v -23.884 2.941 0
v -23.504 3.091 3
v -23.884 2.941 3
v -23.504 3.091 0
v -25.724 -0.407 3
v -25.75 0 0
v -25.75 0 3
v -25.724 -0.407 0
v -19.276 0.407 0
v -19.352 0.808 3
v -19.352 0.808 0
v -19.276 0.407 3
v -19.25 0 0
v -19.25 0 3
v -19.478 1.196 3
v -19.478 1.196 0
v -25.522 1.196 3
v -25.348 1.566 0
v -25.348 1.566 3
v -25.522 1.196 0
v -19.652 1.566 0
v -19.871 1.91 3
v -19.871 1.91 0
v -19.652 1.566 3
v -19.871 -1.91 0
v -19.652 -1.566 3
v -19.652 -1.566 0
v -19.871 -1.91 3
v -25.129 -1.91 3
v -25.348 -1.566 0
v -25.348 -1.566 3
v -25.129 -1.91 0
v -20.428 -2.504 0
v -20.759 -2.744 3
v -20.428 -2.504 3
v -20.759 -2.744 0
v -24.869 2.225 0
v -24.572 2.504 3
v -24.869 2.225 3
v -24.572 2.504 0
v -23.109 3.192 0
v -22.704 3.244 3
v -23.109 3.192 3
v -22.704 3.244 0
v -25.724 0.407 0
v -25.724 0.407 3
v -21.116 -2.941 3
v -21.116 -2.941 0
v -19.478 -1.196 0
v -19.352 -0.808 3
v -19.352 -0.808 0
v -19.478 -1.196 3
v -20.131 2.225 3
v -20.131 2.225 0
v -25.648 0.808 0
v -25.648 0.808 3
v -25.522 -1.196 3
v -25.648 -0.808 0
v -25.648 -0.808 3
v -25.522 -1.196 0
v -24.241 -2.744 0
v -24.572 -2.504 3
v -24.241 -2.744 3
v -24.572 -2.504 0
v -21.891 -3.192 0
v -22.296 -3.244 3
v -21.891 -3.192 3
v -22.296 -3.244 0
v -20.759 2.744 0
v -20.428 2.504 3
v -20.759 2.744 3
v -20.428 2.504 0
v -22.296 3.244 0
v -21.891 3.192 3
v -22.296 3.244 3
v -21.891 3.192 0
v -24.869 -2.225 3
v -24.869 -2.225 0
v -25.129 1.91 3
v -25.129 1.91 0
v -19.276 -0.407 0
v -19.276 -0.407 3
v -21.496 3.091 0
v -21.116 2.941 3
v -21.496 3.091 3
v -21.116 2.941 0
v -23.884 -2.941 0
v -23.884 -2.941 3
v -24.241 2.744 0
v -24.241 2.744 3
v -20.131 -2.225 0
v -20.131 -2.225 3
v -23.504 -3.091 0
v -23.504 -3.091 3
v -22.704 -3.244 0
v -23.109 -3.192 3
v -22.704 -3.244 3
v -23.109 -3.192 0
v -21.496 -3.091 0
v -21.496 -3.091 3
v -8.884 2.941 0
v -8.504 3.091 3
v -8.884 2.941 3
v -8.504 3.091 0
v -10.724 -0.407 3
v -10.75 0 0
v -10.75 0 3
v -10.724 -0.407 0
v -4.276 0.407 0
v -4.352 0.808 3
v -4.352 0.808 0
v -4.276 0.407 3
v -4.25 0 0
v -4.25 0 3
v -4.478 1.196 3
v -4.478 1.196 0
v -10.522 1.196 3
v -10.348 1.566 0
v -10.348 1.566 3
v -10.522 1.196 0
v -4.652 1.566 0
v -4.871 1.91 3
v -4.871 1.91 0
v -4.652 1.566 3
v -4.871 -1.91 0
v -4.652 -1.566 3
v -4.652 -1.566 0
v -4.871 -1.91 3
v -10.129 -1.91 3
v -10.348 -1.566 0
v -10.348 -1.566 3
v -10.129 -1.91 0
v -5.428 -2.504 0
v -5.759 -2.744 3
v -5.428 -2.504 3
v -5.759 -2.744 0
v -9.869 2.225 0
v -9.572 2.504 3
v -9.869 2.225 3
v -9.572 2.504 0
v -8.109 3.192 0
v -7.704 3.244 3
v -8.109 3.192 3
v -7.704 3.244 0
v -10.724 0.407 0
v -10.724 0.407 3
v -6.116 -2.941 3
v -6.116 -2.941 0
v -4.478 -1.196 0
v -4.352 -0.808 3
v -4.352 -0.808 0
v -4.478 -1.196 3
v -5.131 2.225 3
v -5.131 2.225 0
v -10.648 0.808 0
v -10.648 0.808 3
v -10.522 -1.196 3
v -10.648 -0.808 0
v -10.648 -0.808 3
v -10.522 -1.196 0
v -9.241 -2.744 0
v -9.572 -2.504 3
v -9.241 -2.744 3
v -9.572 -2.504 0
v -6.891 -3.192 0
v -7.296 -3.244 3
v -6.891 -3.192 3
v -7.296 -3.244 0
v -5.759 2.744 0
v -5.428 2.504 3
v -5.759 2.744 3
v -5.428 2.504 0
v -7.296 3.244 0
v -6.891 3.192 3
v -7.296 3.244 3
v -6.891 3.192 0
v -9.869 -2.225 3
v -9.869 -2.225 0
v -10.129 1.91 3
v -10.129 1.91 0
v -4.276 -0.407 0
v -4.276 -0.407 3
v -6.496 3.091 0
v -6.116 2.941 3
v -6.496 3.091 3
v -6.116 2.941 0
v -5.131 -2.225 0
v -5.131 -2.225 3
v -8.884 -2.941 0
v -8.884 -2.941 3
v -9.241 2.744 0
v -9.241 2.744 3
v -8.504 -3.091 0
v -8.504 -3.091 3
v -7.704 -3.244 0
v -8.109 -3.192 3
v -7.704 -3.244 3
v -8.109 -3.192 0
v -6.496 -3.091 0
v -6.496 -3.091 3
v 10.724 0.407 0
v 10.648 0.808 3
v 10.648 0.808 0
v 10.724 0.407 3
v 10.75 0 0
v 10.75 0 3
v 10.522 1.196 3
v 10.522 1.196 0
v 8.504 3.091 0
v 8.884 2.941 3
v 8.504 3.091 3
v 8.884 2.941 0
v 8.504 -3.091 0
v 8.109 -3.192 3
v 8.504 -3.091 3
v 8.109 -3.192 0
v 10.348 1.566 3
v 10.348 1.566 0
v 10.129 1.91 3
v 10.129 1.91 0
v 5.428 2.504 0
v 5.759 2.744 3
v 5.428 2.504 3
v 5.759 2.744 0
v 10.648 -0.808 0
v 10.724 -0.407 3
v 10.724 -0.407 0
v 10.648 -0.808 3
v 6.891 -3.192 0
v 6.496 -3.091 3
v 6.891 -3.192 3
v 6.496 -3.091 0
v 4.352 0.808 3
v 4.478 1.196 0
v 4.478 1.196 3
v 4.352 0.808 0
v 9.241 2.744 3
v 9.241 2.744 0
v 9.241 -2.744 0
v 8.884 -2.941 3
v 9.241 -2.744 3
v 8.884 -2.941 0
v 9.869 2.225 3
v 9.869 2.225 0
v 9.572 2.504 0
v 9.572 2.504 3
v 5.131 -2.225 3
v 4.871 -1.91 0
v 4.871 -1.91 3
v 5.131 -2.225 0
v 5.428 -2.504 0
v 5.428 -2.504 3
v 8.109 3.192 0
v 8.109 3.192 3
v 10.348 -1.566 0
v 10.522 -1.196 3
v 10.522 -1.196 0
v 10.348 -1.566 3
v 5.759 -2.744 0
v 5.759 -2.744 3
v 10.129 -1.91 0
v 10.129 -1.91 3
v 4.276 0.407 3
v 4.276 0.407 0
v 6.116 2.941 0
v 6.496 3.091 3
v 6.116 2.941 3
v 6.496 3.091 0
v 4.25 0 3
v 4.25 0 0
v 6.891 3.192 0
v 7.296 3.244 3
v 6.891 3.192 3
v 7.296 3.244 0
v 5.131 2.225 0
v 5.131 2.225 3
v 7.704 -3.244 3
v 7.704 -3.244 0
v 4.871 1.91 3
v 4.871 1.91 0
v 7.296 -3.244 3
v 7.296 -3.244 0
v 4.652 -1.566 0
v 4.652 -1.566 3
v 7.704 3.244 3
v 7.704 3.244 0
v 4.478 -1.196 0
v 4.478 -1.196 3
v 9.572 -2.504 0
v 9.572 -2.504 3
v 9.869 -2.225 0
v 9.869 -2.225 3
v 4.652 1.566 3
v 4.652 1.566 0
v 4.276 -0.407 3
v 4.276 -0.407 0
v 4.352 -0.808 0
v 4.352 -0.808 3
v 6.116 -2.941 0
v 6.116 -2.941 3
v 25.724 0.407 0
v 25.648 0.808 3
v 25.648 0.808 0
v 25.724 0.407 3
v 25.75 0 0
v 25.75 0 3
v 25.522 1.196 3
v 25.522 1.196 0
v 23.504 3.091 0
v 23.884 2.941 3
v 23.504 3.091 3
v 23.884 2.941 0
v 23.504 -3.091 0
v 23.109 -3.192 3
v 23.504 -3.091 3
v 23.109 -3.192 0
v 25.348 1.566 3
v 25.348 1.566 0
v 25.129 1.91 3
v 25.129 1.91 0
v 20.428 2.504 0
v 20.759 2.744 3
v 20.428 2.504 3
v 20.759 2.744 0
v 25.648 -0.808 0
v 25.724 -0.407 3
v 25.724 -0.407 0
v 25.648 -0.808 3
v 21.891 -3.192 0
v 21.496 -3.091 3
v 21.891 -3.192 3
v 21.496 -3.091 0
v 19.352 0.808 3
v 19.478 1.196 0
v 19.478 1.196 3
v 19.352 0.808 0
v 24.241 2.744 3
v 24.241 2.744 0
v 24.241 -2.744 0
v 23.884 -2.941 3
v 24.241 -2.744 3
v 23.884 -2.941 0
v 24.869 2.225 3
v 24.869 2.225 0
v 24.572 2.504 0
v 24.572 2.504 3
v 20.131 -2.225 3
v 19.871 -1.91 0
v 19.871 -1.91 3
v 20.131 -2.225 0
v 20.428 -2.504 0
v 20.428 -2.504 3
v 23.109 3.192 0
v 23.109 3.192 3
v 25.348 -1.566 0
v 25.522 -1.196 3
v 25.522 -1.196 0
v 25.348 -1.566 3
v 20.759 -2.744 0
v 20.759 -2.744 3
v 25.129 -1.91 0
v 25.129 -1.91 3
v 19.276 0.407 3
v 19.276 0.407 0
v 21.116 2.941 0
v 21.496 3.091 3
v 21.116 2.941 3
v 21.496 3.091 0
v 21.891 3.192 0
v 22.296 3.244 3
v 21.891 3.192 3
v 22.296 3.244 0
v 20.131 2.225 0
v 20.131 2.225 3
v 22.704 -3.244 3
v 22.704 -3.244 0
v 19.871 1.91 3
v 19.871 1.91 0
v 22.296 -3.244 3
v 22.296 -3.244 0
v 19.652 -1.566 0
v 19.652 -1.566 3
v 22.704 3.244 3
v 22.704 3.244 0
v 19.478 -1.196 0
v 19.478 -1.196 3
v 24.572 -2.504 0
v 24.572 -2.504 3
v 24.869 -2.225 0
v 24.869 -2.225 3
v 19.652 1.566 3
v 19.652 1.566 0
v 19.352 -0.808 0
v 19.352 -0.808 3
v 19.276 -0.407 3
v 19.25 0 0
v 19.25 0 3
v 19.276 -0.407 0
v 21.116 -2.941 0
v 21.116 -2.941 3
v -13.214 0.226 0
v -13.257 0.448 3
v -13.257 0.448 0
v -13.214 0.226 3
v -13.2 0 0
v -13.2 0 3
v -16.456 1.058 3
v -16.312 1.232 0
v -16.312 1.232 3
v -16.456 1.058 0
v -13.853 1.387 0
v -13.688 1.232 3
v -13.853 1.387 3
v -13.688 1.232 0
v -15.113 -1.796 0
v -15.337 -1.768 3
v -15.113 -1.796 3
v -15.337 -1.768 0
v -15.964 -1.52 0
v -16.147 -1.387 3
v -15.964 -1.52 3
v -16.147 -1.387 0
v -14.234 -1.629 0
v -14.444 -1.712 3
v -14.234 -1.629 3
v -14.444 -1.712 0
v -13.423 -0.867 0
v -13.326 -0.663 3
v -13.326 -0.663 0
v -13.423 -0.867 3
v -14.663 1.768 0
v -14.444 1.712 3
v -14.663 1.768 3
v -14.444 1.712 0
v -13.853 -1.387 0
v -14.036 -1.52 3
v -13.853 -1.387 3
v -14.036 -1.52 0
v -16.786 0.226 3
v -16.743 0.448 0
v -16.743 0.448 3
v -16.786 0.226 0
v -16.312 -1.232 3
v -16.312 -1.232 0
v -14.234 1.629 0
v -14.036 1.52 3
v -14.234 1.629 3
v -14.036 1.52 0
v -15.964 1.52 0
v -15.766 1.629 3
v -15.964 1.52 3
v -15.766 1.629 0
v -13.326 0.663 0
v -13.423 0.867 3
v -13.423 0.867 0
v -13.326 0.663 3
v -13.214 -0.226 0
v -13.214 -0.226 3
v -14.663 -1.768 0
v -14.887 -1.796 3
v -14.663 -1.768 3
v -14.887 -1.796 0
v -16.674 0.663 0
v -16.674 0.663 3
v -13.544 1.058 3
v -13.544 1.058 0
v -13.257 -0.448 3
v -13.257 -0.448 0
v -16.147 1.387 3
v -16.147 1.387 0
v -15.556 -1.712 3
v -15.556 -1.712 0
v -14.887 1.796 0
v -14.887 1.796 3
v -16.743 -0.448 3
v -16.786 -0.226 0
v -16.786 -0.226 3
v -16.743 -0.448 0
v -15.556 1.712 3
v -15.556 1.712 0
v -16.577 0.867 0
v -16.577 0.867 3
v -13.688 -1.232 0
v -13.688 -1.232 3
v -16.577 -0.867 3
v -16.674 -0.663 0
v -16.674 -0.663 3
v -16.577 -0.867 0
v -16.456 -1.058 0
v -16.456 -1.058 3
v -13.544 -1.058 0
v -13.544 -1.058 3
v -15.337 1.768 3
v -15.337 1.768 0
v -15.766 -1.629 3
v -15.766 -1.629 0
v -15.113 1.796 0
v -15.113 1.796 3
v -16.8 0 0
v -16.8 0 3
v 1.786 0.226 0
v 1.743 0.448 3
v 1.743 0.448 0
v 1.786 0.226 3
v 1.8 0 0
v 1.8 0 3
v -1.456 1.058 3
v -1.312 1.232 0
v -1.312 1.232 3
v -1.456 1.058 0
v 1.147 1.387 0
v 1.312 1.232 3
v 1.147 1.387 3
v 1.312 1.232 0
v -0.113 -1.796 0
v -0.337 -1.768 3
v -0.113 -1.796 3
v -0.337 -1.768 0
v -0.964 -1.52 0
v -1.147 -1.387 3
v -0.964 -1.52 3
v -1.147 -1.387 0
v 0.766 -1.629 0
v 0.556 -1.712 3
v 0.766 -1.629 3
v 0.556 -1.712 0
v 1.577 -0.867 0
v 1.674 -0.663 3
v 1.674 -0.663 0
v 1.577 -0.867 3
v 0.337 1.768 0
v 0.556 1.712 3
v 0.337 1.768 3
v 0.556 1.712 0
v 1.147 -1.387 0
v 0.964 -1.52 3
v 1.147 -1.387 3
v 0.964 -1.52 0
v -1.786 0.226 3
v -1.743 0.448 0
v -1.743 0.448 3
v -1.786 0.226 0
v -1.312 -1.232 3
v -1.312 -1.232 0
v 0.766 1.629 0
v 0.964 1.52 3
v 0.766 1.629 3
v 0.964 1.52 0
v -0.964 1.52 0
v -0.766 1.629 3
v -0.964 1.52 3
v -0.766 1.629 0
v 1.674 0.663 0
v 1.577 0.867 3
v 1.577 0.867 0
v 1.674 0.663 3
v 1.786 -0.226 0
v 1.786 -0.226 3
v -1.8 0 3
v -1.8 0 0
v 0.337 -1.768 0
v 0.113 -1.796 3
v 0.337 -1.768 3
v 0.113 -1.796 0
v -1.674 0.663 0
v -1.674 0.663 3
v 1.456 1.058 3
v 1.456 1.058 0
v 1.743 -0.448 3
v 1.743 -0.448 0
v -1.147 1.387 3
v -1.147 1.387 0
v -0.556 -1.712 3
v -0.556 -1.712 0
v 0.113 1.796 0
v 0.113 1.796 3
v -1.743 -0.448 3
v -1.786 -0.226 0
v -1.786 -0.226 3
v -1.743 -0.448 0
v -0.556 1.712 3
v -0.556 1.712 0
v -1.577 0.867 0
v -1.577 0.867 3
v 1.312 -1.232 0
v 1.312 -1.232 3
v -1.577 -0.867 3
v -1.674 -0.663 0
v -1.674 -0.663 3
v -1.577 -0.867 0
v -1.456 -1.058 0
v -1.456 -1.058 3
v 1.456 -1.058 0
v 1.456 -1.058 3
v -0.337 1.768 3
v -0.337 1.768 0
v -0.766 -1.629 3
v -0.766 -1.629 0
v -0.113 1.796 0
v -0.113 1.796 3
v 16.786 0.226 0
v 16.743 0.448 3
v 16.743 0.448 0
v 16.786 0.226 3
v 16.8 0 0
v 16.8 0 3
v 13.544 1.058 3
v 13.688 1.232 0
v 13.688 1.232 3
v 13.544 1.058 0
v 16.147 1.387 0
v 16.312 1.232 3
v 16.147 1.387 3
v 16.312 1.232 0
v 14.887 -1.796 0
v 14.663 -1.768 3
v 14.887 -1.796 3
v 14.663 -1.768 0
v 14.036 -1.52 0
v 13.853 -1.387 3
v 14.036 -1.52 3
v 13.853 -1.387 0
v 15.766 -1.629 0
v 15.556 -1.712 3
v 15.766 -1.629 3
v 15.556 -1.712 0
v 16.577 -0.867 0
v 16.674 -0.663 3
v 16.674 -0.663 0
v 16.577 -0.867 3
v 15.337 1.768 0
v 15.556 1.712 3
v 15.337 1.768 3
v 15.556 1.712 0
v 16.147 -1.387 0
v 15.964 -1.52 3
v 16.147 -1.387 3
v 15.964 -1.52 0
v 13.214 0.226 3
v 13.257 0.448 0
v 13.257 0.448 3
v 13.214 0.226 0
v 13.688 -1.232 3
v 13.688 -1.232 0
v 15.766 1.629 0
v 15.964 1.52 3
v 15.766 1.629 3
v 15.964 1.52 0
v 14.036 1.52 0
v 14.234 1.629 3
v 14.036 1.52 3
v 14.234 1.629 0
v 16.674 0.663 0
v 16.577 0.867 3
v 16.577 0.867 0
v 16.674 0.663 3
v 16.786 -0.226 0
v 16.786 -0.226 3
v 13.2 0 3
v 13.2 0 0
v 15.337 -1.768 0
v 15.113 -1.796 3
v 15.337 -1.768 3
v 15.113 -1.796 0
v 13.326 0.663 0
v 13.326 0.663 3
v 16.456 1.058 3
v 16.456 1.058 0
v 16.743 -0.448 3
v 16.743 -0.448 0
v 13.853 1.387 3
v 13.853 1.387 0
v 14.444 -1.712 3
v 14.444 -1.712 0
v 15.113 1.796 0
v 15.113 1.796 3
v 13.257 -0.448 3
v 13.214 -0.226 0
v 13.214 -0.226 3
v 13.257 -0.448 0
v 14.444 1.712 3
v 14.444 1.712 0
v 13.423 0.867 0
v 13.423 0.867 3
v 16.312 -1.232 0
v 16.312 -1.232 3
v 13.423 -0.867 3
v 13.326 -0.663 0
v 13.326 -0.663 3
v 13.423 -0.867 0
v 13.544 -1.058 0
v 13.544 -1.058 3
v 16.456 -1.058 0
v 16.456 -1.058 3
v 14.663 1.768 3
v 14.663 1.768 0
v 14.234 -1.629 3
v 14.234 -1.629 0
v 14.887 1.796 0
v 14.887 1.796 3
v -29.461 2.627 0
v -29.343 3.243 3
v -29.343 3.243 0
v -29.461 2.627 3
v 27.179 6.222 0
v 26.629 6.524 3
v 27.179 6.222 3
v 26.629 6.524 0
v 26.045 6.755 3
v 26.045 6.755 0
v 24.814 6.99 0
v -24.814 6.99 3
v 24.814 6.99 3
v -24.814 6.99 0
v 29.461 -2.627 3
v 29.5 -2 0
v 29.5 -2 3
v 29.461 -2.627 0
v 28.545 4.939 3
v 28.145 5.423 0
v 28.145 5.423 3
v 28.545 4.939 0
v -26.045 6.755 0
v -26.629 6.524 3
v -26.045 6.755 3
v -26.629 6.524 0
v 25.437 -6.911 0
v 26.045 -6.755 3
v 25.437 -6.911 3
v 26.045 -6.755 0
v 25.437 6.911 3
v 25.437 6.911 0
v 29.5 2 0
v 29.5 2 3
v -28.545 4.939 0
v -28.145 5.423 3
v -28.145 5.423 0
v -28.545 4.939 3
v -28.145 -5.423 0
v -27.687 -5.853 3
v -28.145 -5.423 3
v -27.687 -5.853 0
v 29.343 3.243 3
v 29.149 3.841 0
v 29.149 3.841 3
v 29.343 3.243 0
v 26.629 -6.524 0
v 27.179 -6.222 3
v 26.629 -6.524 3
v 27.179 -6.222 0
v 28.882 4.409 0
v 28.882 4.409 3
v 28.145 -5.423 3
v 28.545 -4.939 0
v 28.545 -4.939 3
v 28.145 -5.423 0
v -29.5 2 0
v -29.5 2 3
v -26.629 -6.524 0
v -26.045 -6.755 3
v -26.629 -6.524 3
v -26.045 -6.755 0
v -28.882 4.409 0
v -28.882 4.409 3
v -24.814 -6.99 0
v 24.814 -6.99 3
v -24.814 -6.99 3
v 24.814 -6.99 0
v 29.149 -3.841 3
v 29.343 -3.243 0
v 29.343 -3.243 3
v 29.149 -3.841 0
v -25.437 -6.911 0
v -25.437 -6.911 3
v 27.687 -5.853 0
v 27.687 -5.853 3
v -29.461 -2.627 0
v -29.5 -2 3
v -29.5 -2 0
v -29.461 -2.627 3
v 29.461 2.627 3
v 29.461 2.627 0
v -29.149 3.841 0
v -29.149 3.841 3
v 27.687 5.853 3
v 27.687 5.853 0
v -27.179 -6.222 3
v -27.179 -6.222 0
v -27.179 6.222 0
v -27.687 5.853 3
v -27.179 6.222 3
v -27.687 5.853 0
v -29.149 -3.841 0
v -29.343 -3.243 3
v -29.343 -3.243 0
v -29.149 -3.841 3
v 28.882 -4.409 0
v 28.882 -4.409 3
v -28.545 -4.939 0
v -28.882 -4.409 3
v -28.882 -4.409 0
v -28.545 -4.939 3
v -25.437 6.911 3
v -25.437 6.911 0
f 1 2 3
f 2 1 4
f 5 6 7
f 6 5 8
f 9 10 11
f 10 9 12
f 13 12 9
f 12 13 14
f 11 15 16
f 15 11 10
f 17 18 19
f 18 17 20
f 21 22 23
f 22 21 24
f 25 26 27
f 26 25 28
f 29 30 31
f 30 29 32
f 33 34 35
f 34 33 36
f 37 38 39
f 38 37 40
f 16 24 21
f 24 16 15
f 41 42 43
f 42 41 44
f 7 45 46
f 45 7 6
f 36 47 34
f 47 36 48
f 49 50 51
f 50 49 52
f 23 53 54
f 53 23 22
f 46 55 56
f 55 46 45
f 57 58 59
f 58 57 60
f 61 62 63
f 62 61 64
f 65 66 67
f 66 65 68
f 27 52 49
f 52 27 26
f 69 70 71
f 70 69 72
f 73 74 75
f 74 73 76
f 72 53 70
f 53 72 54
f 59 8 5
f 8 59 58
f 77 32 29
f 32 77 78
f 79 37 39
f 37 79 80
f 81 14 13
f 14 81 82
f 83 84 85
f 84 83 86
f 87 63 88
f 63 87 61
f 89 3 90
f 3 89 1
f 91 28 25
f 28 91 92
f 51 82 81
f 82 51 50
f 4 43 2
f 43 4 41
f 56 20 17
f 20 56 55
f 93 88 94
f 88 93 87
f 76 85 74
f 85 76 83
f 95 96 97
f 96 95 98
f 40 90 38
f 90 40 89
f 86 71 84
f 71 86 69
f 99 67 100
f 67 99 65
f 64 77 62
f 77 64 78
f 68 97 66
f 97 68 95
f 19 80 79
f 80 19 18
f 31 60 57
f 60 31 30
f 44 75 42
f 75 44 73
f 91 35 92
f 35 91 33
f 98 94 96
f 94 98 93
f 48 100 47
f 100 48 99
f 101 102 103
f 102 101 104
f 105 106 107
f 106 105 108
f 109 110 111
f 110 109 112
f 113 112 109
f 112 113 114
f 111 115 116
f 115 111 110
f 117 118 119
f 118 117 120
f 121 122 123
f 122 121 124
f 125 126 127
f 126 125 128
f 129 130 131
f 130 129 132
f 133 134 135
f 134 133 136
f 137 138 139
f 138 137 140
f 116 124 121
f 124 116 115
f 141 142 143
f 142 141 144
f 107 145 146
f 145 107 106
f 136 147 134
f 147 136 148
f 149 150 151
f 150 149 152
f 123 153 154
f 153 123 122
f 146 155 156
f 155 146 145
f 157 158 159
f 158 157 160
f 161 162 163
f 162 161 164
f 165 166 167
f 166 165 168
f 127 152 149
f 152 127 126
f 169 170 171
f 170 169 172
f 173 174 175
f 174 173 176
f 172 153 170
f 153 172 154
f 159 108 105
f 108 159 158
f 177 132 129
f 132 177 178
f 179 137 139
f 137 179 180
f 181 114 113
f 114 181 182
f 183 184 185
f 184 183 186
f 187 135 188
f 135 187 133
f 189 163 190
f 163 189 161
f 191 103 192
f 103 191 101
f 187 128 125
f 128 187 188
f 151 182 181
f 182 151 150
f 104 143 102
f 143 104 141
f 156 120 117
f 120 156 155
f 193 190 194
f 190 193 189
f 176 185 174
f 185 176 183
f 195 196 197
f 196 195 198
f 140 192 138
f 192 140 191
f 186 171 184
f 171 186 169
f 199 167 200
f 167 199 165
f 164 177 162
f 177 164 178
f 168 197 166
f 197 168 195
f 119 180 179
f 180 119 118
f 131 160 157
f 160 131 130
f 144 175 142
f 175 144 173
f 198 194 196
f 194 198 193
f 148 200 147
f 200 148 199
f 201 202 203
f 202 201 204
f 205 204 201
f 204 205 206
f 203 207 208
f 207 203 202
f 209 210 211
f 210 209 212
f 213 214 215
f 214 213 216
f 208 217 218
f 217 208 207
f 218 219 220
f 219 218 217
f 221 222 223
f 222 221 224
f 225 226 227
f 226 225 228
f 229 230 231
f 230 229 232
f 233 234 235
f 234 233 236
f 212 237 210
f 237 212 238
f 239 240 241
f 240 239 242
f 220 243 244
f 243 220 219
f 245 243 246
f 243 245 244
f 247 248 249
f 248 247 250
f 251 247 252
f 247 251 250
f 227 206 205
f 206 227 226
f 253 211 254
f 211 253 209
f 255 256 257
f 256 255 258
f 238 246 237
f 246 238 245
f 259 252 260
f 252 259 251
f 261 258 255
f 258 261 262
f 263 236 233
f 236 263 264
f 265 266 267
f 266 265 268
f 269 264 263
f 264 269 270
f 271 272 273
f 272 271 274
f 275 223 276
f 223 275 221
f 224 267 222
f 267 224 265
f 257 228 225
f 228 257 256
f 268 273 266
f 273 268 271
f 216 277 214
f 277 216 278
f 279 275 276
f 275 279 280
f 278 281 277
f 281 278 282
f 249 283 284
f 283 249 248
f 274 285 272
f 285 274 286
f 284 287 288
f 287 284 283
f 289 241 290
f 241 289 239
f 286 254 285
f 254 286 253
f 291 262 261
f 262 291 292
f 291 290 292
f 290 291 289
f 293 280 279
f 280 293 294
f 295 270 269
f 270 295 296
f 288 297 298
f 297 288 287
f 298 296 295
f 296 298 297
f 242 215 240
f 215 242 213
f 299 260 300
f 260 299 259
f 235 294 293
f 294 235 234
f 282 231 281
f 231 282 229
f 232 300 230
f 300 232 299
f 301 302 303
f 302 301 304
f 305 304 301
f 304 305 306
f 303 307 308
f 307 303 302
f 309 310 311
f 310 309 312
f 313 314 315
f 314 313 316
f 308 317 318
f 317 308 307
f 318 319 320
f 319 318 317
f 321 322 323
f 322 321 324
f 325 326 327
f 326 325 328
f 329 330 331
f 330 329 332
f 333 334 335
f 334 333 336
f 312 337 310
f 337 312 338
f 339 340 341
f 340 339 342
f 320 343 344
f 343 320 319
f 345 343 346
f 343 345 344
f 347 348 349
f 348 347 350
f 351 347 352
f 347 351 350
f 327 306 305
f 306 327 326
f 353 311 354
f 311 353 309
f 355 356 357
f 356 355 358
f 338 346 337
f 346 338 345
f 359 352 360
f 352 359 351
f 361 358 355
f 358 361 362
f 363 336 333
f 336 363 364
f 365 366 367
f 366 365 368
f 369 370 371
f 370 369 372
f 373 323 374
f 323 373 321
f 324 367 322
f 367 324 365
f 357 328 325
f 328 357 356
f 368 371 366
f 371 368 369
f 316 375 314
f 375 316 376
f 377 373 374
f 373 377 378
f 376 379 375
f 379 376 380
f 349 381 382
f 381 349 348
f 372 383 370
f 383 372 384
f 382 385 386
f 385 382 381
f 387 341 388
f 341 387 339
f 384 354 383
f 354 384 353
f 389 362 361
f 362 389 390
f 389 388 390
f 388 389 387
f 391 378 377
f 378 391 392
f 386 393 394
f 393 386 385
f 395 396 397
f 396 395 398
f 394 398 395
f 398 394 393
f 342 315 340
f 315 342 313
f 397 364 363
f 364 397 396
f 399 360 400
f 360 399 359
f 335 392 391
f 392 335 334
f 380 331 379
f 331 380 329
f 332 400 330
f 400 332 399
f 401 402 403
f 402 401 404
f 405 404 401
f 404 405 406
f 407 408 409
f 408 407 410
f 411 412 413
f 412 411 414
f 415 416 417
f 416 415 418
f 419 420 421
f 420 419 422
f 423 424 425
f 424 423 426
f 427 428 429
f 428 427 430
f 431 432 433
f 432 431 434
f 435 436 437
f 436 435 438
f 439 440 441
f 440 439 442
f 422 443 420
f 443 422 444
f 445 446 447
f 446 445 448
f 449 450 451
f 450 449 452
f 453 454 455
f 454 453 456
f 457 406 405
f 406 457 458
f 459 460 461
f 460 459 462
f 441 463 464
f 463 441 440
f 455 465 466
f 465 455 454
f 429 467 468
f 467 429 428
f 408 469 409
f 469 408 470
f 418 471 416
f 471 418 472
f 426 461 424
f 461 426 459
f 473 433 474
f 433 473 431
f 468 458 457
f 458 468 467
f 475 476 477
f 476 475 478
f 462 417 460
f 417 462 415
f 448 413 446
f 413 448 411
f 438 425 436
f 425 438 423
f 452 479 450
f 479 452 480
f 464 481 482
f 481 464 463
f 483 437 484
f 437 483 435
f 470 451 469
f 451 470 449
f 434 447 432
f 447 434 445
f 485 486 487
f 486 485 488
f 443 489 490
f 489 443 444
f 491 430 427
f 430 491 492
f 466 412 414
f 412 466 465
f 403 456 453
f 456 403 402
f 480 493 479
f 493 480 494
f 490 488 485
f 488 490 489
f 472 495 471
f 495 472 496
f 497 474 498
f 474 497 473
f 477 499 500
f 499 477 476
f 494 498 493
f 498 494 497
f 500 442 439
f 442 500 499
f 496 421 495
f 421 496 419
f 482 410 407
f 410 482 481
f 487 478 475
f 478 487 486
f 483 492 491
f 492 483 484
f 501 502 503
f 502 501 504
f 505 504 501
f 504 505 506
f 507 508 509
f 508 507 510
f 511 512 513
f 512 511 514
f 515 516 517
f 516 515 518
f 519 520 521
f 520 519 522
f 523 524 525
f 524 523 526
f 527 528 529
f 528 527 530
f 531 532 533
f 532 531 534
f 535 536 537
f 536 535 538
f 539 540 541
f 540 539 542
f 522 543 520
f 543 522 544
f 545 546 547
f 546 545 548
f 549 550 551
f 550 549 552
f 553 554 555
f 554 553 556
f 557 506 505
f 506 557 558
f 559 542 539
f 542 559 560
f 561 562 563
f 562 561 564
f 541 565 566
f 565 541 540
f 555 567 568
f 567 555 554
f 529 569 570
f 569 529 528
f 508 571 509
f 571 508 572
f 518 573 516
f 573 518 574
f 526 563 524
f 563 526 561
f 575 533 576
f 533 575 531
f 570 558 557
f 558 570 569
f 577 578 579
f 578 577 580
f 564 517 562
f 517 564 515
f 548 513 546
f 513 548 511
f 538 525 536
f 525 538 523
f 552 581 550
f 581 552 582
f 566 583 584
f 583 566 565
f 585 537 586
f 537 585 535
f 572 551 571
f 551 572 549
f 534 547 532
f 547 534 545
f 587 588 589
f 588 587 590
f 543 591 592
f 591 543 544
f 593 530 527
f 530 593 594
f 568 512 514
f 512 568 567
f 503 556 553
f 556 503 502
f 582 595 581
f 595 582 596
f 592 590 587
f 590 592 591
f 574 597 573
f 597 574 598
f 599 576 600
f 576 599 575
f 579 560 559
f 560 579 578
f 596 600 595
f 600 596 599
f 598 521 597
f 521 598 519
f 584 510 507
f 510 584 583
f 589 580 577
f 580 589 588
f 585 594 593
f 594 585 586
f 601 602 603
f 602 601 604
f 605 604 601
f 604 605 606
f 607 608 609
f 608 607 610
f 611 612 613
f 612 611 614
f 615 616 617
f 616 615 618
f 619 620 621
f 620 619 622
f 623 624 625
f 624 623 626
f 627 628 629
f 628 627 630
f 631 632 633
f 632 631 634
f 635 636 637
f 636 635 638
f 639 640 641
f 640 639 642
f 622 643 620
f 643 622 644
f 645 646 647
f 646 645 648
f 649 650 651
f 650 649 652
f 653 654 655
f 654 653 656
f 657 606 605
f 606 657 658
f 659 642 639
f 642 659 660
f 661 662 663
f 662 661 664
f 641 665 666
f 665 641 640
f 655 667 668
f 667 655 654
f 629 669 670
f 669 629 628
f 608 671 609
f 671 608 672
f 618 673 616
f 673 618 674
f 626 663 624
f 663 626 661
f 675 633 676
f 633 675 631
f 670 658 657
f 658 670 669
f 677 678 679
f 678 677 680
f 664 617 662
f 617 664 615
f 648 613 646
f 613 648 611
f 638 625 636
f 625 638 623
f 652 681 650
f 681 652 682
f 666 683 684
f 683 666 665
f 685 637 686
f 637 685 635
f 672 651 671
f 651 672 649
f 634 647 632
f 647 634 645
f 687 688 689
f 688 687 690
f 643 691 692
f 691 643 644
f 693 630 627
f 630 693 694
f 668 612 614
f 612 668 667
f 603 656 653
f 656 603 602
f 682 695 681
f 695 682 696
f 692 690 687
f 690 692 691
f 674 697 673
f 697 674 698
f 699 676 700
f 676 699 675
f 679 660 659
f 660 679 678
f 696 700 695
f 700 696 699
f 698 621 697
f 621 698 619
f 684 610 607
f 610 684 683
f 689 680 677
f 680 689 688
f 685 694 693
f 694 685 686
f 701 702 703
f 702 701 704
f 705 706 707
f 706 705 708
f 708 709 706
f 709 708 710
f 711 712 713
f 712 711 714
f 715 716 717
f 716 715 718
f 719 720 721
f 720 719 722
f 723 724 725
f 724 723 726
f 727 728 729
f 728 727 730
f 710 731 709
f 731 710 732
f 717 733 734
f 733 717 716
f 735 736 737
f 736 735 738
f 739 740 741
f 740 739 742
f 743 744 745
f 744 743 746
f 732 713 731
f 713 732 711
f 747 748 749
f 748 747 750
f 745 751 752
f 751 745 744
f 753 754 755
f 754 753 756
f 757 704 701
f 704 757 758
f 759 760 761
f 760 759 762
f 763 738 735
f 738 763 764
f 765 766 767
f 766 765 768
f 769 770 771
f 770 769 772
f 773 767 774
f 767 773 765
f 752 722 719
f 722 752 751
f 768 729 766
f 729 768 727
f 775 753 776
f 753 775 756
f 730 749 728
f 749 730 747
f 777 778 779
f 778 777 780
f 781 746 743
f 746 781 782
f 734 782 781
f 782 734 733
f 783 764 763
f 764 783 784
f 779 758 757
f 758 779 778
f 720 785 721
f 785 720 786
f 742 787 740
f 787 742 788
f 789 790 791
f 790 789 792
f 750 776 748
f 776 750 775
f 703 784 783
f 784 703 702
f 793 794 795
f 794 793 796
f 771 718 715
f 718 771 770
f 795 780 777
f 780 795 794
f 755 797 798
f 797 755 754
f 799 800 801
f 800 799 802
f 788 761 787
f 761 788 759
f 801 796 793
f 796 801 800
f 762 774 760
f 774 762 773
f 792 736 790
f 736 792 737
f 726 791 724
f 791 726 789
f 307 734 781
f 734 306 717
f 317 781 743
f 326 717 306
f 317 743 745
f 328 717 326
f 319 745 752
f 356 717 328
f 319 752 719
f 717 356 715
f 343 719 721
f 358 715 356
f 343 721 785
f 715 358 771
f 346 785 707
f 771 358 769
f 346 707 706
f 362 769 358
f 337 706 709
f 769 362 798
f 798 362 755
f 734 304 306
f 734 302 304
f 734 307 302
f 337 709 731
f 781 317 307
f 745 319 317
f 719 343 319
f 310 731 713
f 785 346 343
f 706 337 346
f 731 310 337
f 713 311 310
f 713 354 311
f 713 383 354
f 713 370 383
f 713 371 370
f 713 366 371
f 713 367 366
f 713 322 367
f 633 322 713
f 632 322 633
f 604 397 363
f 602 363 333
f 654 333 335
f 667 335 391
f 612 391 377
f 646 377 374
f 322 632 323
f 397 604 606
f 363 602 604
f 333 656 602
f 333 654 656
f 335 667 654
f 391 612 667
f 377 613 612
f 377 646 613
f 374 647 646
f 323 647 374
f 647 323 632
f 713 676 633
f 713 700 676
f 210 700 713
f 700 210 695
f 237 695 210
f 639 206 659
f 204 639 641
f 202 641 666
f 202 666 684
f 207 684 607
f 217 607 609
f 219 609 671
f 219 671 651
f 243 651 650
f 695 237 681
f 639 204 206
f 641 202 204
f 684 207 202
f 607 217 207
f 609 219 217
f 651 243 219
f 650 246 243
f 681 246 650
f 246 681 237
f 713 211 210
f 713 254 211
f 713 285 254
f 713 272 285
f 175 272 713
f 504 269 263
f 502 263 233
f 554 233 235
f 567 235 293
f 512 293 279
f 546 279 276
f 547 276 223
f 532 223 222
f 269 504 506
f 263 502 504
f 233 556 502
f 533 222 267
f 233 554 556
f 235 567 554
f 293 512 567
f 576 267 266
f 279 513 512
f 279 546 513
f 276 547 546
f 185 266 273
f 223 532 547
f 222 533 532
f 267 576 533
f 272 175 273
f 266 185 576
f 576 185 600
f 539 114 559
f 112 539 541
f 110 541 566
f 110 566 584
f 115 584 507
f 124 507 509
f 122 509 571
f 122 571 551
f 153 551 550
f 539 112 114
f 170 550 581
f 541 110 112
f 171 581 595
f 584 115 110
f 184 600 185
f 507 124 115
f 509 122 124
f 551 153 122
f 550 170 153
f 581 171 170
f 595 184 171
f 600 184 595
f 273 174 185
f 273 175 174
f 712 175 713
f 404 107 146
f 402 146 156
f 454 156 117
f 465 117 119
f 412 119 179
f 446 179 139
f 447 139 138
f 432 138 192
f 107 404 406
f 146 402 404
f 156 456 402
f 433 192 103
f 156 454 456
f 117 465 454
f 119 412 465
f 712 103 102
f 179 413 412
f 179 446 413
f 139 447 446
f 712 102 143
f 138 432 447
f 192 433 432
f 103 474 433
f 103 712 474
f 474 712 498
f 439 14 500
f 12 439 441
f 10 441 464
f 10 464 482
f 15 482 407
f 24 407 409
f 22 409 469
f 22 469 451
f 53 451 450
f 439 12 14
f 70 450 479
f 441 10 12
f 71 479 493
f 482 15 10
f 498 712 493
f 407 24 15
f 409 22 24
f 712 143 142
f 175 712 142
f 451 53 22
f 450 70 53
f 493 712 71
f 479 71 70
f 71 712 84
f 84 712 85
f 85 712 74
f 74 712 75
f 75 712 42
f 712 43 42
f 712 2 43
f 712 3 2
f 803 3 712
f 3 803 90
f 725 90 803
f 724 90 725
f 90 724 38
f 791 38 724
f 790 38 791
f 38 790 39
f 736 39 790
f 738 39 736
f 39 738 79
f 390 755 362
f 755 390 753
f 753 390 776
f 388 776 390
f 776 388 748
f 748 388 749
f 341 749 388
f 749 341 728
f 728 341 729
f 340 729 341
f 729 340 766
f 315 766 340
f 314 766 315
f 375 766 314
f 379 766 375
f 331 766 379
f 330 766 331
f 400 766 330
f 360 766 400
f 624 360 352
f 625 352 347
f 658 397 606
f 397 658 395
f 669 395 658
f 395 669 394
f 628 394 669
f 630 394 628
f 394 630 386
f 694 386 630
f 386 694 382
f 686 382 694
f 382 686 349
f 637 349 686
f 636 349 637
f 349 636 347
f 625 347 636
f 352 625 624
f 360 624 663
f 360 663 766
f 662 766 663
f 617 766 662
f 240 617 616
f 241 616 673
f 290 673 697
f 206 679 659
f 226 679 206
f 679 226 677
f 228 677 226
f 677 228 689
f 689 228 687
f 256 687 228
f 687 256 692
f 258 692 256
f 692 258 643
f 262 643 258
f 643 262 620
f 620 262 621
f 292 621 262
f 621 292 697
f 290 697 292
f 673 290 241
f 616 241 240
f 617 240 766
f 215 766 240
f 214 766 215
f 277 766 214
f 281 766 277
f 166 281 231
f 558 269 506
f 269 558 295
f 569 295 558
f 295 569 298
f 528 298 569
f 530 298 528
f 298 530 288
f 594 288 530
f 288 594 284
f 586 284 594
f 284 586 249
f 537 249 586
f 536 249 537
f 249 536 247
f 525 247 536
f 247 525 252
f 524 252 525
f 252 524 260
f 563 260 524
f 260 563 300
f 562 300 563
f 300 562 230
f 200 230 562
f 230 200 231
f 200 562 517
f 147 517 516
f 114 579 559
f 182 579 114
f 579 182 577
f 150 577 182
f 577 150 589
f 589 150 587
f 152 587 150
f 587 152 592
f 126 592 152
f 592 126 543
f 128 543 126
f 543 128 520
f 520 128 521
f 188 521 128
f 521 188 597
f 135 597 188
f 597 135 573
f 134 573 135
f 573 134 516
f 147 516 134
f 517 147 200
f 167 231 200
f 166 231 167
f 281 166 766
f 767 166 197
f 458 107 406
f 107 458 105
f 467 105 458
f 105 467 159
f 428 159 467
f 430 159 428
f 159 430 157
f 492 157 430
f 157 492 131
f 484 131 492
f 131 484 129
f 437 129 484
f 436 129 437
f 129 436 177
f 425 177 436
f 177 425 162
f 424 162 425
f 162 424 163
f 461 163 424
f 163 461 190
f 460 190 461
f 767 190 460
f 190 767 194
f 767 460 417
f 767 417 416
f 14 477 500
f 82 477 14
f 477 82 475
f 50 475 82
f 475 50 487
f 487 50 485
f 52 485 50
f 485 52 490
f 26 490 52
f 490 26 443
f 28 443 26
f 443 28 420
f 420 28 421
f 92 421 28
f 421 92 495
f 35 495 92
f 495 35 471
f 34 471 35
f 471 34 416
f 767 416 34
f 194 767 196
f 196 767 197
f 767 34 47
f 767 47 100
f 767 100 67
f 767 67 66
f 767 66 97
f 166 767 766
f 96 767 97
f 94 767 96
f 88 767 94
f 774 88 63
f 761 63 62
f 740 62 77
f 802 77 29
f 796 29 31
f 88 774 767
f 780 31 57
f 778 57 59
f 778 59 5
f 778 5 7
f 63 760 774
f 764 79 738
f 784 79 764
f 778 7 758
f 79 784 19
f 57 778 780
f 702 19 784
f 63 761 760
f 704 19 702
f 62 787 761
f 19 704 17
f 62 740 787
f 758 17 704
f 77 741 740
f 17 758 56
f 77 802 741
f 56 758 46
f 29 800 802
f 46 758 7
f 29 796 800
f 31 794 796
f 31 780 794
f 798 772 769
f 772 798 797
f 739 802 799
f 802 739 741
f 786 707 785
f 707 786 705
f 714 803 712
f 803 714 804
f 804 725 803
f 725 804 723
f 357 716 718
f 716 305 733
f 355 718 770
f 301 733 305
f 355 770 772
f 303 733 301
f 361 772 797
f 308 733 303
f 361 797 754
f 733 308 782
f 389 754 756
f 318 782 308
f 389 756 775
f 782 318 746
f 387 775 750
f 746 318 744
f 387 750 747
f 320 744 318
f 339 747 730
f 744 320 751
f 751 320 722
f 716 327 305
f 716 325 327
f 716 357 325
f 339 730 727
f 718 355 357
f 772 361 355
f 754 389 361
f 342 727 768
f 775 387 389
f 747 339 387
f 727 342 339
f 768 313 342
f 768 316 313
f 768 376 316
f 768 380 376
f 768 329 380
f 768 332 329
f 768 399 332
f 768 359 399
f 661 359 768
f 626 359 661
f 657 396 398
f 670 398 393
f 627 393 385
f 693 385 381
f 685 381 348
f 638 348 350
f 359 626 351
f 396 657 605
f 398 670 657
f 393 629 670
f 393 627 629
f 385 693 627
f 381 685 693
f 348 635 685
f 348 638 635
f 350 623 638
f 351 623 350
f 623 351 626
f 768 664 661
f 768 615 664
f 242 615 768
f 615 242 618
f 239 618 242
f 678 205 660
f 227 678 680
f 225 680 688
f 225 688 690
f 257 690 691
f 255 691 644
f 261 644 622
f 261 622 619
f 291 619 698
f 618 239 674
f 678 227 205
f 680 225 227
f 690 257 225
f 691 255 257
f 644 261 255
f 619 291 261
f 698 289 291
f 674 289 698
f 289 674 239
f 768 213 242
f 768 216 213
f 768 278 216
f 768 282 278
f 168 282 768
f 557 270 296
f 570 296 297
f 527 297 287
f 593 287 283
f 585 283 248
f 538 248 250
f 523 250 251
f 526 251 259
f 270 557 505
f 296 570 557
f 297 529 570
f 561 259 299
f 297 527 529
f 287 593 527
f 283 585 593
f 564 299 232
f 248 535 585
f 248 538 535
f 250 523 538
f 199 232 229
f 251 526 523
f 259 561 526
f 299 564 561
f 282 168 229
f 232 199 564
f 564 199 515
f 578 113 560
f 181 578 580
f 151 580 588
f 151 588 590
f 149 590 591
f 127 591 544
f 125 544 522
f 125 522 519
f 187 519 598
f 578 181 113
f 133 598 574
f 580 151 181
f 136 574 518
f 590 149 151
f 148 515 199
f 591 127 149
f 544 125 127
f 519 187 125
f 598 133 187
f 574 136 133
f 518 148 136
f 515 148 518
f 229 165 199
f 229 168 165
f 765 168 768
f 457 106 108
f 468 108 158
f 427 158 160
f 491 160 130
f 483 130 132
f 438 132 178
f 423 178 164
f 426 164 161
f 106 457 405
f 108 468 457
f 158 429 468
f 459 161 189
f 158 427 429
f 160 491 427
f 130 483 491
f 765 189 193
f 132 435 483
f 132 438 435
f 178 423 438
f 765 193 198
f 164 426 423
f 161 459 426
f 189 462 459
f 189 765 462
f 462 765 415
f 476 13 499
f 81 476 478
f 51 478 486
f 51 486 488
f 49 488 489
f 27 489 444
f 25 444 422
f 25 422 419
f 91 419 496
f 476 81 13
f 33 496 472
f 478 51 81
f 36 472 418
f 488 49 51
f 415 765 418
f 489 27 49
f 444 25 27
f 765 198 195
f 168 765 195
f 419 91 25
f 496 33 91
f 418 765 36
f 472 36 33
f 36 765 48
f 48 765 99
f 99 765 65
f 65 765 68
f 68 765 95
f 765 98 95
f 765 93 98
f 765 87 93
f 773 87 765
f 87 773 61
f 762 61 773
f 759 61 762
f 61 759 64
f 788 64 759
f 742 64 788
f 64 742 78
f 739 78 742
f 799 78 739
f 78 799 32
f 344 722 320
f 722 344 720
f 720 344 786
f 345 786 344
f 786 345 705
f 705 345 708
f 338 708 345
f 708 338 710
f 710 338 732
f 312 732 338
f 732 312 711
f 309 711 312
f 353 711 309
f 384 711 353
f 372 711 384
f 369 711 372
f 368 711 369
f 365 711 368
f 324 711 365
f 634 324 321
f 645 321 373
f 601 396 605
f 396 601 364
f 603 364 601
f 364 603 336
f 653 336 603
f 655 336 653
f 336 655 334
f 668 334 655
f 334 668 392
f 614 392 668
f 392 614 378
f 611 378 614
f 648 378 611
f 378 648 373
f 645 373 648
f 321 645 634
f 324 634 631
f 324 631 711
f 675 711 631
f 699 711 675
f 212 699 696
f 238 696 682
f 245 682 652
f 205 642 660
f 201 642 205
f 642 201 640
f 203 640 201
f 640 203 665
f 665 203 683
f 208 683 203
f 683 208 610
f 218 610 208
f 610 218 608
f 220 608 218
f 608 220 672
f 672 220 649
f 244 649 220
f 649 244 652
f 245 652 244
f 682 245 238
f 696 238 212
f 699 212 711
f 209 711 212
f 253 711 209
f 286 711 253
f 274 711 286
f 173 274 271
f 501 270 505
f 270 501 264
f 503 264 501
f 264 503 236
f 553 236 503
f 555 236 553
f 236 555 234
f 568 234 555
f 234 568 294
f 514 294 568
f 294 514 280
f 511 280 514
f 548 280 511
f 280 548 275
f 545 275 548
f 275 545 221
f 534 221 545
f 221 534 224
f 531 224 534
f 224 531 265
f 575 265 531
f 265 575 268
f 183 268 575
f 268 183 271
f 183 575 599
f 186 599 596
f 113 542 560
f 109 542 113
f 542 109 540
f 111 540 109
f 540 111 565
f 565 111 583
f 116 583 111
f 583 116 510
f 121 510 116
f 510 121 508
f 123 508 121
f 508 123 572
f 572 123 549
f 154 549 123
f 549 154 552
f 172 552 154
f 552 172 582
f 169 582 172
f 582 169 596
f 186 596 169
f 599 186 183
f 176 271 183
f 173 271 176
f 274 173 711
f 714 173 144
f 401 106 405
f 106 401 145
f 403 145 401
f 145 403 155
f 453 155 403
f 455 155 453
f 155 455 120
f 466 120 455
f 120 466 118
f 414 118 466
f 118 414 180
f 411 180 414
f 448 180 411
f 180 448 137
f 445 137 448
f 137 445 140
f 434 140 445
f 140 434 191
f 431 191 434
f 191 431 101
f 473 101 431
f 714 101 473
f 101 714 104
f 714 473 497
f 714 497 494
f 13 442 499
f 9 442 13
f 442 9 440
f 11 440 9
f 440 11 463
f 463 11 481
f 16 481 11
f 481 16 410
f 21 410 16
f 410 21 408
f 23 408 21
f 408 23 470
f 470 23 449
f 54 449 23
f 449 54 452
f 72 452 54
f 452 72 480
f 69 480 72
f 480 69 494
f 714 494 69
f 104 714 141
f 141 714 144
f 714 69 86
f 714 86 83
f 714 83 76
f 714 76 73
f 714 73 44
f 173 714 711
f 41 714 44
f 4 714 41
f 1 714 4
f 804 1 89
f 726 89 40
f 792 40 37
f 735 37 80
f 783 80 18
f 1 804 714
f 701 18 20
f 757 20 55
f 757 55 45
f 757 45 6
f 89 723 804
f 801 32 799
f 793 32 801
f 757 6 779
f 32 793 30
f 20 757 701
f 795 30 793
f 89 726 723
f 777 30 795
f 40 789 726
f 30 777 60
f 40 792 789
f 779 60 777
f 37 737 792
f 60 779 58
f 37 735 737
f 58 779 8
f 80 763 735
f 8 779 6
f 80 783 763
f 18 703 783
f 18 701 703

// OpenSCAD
$fn = 50;


difference() {
	union() {
		*color(alpha = 1.0000000000, c = "gray") {
			translate(v = [0, 7, 0]) {
				linear_extrude(height = 1) {
					text(font = "Arial:style=Bold", halign = "center", size = 4.5000000000, text = "COMMENT plate main", valign = "center");
				}
			}
		}
		*color(alpha = 1.0000000000, c = "gray") {
			translate(v = [0, 14, 0]) {
				linear_extrude(height = 1) {
					text(font = "Arial:style=Bold", halign = "center", size = 4.5000000000, text = "COMMENT description oobb_plate_shape_p_type_3_depth_4_width_1_height_3_thickness_true_both_holes", valign = "center");
				}
			}
		}
		hull() {
			translate(v = [-24.5000000000, 2.0000000000, 0]) {
				cylinder(h = 3, r = 5);
			}
			translate(v = [24.5000000000, 2.0000000000, 0]) {
				cylinder(h = 3, r = 5);
			}
			translate(v = [-24.5000000000, -2.0000000000, 0]) {
				cylinder(h = 3, r = 5);
			}
			translate(v = [24.5000000000, -2.0000000000, 0]) {
				cylinder(h = 3, r = 5);
			}
		}
	}
	union() {
		*color(alpha = 1.0000000000, c = "gray") {
			translate(v = [0, 7, 0]) {
				linear_extrude(height = 1) {
					text(font = "Arial:style=Bold", halign = "center", size = 4.5000000000, text = "COMMENT holes main", valign = "center");
				}
			}
		}
		*color(alpha = 1.0000000000, c = "gray") {
			translate(v = [0, 14, 0]) {
				linear_extrude(height = 1) {
					text(font = "Arial:style=Bold", halign = "center", size = 4.5000000000, text = "COMMENT description oobb_holes_shape_n_type_4_width_1_height_3_thickness_true_both_holes", valign = "center");
				}
			}
		}
		translate(v = [-22.5000000000, 0.0000000000, 0]) {
			translate(v = [0, 0, -50]) {
				cylinder(h = 100, r = 3.2500000000);
			}
		}
		translate(v = [-7.5000000000, 0.0000000000, 0]) {
			translate(v = [0, 0, -50]) {
				cylinder(h = 100, r = 3.2500000000);
			}
		}
		translate(v = [7.5000000000, 0.0000000000, 0]) {
			translate(v = [0, 0, -50]) {
				cylinder(h = 100, r = 3.2500000000);
			}
		}
		translate(v = [22.5000000000, 0.0000000000, 0]) {
			translate(v = [0, 0, -50]) {
				cylinder(h = 100, r = 3.2500000000);
			}
		}
		translate(v = [-22.5000000000, 0.0000000000, 0]) {
			translate(v = [0, 0, -50]) {
				cylinder(h = 100, r = 1.8000000000);
			}
		}
		translate(v = [-15.0000000000, 0.0000000000, 0]) {
			translate(v = [0, 0, -50]) {
				cylinder(h = 100, r = 1.8000000000);
			}
		}
		translate(v = [-7.5000000000, 0.0000000000, 0]) {
			translate(v = [0, 0, -50]) {
				cylinder(h = 100, r = 1.8000000000);
			}
		}
		translate(v = [0, 0, -50]) {
			cylinder(h = 100, r = 1.8000000000);
		}
		translate(v = [7.5000000000, 0.0000000000, 0]) {
			translate(v = [0, 0, -50]) {
				cylinder(h = 100, r = 1.8000000000);
			}
		}
		translate(v = [15.0000000000, 0.0000000000, 0]) {
			translate(v = [0, 0, -50]) {
				cylinder(h = 100, r = 1.8000000000);
			}
		}
		translate(v = [22.5000000000, 0.0000000000, 0]) {
			translate(v = [0, 0, -50]) {
				cylinder(h = 100, r = 1.8000000000);
			}
		}
	}
}
